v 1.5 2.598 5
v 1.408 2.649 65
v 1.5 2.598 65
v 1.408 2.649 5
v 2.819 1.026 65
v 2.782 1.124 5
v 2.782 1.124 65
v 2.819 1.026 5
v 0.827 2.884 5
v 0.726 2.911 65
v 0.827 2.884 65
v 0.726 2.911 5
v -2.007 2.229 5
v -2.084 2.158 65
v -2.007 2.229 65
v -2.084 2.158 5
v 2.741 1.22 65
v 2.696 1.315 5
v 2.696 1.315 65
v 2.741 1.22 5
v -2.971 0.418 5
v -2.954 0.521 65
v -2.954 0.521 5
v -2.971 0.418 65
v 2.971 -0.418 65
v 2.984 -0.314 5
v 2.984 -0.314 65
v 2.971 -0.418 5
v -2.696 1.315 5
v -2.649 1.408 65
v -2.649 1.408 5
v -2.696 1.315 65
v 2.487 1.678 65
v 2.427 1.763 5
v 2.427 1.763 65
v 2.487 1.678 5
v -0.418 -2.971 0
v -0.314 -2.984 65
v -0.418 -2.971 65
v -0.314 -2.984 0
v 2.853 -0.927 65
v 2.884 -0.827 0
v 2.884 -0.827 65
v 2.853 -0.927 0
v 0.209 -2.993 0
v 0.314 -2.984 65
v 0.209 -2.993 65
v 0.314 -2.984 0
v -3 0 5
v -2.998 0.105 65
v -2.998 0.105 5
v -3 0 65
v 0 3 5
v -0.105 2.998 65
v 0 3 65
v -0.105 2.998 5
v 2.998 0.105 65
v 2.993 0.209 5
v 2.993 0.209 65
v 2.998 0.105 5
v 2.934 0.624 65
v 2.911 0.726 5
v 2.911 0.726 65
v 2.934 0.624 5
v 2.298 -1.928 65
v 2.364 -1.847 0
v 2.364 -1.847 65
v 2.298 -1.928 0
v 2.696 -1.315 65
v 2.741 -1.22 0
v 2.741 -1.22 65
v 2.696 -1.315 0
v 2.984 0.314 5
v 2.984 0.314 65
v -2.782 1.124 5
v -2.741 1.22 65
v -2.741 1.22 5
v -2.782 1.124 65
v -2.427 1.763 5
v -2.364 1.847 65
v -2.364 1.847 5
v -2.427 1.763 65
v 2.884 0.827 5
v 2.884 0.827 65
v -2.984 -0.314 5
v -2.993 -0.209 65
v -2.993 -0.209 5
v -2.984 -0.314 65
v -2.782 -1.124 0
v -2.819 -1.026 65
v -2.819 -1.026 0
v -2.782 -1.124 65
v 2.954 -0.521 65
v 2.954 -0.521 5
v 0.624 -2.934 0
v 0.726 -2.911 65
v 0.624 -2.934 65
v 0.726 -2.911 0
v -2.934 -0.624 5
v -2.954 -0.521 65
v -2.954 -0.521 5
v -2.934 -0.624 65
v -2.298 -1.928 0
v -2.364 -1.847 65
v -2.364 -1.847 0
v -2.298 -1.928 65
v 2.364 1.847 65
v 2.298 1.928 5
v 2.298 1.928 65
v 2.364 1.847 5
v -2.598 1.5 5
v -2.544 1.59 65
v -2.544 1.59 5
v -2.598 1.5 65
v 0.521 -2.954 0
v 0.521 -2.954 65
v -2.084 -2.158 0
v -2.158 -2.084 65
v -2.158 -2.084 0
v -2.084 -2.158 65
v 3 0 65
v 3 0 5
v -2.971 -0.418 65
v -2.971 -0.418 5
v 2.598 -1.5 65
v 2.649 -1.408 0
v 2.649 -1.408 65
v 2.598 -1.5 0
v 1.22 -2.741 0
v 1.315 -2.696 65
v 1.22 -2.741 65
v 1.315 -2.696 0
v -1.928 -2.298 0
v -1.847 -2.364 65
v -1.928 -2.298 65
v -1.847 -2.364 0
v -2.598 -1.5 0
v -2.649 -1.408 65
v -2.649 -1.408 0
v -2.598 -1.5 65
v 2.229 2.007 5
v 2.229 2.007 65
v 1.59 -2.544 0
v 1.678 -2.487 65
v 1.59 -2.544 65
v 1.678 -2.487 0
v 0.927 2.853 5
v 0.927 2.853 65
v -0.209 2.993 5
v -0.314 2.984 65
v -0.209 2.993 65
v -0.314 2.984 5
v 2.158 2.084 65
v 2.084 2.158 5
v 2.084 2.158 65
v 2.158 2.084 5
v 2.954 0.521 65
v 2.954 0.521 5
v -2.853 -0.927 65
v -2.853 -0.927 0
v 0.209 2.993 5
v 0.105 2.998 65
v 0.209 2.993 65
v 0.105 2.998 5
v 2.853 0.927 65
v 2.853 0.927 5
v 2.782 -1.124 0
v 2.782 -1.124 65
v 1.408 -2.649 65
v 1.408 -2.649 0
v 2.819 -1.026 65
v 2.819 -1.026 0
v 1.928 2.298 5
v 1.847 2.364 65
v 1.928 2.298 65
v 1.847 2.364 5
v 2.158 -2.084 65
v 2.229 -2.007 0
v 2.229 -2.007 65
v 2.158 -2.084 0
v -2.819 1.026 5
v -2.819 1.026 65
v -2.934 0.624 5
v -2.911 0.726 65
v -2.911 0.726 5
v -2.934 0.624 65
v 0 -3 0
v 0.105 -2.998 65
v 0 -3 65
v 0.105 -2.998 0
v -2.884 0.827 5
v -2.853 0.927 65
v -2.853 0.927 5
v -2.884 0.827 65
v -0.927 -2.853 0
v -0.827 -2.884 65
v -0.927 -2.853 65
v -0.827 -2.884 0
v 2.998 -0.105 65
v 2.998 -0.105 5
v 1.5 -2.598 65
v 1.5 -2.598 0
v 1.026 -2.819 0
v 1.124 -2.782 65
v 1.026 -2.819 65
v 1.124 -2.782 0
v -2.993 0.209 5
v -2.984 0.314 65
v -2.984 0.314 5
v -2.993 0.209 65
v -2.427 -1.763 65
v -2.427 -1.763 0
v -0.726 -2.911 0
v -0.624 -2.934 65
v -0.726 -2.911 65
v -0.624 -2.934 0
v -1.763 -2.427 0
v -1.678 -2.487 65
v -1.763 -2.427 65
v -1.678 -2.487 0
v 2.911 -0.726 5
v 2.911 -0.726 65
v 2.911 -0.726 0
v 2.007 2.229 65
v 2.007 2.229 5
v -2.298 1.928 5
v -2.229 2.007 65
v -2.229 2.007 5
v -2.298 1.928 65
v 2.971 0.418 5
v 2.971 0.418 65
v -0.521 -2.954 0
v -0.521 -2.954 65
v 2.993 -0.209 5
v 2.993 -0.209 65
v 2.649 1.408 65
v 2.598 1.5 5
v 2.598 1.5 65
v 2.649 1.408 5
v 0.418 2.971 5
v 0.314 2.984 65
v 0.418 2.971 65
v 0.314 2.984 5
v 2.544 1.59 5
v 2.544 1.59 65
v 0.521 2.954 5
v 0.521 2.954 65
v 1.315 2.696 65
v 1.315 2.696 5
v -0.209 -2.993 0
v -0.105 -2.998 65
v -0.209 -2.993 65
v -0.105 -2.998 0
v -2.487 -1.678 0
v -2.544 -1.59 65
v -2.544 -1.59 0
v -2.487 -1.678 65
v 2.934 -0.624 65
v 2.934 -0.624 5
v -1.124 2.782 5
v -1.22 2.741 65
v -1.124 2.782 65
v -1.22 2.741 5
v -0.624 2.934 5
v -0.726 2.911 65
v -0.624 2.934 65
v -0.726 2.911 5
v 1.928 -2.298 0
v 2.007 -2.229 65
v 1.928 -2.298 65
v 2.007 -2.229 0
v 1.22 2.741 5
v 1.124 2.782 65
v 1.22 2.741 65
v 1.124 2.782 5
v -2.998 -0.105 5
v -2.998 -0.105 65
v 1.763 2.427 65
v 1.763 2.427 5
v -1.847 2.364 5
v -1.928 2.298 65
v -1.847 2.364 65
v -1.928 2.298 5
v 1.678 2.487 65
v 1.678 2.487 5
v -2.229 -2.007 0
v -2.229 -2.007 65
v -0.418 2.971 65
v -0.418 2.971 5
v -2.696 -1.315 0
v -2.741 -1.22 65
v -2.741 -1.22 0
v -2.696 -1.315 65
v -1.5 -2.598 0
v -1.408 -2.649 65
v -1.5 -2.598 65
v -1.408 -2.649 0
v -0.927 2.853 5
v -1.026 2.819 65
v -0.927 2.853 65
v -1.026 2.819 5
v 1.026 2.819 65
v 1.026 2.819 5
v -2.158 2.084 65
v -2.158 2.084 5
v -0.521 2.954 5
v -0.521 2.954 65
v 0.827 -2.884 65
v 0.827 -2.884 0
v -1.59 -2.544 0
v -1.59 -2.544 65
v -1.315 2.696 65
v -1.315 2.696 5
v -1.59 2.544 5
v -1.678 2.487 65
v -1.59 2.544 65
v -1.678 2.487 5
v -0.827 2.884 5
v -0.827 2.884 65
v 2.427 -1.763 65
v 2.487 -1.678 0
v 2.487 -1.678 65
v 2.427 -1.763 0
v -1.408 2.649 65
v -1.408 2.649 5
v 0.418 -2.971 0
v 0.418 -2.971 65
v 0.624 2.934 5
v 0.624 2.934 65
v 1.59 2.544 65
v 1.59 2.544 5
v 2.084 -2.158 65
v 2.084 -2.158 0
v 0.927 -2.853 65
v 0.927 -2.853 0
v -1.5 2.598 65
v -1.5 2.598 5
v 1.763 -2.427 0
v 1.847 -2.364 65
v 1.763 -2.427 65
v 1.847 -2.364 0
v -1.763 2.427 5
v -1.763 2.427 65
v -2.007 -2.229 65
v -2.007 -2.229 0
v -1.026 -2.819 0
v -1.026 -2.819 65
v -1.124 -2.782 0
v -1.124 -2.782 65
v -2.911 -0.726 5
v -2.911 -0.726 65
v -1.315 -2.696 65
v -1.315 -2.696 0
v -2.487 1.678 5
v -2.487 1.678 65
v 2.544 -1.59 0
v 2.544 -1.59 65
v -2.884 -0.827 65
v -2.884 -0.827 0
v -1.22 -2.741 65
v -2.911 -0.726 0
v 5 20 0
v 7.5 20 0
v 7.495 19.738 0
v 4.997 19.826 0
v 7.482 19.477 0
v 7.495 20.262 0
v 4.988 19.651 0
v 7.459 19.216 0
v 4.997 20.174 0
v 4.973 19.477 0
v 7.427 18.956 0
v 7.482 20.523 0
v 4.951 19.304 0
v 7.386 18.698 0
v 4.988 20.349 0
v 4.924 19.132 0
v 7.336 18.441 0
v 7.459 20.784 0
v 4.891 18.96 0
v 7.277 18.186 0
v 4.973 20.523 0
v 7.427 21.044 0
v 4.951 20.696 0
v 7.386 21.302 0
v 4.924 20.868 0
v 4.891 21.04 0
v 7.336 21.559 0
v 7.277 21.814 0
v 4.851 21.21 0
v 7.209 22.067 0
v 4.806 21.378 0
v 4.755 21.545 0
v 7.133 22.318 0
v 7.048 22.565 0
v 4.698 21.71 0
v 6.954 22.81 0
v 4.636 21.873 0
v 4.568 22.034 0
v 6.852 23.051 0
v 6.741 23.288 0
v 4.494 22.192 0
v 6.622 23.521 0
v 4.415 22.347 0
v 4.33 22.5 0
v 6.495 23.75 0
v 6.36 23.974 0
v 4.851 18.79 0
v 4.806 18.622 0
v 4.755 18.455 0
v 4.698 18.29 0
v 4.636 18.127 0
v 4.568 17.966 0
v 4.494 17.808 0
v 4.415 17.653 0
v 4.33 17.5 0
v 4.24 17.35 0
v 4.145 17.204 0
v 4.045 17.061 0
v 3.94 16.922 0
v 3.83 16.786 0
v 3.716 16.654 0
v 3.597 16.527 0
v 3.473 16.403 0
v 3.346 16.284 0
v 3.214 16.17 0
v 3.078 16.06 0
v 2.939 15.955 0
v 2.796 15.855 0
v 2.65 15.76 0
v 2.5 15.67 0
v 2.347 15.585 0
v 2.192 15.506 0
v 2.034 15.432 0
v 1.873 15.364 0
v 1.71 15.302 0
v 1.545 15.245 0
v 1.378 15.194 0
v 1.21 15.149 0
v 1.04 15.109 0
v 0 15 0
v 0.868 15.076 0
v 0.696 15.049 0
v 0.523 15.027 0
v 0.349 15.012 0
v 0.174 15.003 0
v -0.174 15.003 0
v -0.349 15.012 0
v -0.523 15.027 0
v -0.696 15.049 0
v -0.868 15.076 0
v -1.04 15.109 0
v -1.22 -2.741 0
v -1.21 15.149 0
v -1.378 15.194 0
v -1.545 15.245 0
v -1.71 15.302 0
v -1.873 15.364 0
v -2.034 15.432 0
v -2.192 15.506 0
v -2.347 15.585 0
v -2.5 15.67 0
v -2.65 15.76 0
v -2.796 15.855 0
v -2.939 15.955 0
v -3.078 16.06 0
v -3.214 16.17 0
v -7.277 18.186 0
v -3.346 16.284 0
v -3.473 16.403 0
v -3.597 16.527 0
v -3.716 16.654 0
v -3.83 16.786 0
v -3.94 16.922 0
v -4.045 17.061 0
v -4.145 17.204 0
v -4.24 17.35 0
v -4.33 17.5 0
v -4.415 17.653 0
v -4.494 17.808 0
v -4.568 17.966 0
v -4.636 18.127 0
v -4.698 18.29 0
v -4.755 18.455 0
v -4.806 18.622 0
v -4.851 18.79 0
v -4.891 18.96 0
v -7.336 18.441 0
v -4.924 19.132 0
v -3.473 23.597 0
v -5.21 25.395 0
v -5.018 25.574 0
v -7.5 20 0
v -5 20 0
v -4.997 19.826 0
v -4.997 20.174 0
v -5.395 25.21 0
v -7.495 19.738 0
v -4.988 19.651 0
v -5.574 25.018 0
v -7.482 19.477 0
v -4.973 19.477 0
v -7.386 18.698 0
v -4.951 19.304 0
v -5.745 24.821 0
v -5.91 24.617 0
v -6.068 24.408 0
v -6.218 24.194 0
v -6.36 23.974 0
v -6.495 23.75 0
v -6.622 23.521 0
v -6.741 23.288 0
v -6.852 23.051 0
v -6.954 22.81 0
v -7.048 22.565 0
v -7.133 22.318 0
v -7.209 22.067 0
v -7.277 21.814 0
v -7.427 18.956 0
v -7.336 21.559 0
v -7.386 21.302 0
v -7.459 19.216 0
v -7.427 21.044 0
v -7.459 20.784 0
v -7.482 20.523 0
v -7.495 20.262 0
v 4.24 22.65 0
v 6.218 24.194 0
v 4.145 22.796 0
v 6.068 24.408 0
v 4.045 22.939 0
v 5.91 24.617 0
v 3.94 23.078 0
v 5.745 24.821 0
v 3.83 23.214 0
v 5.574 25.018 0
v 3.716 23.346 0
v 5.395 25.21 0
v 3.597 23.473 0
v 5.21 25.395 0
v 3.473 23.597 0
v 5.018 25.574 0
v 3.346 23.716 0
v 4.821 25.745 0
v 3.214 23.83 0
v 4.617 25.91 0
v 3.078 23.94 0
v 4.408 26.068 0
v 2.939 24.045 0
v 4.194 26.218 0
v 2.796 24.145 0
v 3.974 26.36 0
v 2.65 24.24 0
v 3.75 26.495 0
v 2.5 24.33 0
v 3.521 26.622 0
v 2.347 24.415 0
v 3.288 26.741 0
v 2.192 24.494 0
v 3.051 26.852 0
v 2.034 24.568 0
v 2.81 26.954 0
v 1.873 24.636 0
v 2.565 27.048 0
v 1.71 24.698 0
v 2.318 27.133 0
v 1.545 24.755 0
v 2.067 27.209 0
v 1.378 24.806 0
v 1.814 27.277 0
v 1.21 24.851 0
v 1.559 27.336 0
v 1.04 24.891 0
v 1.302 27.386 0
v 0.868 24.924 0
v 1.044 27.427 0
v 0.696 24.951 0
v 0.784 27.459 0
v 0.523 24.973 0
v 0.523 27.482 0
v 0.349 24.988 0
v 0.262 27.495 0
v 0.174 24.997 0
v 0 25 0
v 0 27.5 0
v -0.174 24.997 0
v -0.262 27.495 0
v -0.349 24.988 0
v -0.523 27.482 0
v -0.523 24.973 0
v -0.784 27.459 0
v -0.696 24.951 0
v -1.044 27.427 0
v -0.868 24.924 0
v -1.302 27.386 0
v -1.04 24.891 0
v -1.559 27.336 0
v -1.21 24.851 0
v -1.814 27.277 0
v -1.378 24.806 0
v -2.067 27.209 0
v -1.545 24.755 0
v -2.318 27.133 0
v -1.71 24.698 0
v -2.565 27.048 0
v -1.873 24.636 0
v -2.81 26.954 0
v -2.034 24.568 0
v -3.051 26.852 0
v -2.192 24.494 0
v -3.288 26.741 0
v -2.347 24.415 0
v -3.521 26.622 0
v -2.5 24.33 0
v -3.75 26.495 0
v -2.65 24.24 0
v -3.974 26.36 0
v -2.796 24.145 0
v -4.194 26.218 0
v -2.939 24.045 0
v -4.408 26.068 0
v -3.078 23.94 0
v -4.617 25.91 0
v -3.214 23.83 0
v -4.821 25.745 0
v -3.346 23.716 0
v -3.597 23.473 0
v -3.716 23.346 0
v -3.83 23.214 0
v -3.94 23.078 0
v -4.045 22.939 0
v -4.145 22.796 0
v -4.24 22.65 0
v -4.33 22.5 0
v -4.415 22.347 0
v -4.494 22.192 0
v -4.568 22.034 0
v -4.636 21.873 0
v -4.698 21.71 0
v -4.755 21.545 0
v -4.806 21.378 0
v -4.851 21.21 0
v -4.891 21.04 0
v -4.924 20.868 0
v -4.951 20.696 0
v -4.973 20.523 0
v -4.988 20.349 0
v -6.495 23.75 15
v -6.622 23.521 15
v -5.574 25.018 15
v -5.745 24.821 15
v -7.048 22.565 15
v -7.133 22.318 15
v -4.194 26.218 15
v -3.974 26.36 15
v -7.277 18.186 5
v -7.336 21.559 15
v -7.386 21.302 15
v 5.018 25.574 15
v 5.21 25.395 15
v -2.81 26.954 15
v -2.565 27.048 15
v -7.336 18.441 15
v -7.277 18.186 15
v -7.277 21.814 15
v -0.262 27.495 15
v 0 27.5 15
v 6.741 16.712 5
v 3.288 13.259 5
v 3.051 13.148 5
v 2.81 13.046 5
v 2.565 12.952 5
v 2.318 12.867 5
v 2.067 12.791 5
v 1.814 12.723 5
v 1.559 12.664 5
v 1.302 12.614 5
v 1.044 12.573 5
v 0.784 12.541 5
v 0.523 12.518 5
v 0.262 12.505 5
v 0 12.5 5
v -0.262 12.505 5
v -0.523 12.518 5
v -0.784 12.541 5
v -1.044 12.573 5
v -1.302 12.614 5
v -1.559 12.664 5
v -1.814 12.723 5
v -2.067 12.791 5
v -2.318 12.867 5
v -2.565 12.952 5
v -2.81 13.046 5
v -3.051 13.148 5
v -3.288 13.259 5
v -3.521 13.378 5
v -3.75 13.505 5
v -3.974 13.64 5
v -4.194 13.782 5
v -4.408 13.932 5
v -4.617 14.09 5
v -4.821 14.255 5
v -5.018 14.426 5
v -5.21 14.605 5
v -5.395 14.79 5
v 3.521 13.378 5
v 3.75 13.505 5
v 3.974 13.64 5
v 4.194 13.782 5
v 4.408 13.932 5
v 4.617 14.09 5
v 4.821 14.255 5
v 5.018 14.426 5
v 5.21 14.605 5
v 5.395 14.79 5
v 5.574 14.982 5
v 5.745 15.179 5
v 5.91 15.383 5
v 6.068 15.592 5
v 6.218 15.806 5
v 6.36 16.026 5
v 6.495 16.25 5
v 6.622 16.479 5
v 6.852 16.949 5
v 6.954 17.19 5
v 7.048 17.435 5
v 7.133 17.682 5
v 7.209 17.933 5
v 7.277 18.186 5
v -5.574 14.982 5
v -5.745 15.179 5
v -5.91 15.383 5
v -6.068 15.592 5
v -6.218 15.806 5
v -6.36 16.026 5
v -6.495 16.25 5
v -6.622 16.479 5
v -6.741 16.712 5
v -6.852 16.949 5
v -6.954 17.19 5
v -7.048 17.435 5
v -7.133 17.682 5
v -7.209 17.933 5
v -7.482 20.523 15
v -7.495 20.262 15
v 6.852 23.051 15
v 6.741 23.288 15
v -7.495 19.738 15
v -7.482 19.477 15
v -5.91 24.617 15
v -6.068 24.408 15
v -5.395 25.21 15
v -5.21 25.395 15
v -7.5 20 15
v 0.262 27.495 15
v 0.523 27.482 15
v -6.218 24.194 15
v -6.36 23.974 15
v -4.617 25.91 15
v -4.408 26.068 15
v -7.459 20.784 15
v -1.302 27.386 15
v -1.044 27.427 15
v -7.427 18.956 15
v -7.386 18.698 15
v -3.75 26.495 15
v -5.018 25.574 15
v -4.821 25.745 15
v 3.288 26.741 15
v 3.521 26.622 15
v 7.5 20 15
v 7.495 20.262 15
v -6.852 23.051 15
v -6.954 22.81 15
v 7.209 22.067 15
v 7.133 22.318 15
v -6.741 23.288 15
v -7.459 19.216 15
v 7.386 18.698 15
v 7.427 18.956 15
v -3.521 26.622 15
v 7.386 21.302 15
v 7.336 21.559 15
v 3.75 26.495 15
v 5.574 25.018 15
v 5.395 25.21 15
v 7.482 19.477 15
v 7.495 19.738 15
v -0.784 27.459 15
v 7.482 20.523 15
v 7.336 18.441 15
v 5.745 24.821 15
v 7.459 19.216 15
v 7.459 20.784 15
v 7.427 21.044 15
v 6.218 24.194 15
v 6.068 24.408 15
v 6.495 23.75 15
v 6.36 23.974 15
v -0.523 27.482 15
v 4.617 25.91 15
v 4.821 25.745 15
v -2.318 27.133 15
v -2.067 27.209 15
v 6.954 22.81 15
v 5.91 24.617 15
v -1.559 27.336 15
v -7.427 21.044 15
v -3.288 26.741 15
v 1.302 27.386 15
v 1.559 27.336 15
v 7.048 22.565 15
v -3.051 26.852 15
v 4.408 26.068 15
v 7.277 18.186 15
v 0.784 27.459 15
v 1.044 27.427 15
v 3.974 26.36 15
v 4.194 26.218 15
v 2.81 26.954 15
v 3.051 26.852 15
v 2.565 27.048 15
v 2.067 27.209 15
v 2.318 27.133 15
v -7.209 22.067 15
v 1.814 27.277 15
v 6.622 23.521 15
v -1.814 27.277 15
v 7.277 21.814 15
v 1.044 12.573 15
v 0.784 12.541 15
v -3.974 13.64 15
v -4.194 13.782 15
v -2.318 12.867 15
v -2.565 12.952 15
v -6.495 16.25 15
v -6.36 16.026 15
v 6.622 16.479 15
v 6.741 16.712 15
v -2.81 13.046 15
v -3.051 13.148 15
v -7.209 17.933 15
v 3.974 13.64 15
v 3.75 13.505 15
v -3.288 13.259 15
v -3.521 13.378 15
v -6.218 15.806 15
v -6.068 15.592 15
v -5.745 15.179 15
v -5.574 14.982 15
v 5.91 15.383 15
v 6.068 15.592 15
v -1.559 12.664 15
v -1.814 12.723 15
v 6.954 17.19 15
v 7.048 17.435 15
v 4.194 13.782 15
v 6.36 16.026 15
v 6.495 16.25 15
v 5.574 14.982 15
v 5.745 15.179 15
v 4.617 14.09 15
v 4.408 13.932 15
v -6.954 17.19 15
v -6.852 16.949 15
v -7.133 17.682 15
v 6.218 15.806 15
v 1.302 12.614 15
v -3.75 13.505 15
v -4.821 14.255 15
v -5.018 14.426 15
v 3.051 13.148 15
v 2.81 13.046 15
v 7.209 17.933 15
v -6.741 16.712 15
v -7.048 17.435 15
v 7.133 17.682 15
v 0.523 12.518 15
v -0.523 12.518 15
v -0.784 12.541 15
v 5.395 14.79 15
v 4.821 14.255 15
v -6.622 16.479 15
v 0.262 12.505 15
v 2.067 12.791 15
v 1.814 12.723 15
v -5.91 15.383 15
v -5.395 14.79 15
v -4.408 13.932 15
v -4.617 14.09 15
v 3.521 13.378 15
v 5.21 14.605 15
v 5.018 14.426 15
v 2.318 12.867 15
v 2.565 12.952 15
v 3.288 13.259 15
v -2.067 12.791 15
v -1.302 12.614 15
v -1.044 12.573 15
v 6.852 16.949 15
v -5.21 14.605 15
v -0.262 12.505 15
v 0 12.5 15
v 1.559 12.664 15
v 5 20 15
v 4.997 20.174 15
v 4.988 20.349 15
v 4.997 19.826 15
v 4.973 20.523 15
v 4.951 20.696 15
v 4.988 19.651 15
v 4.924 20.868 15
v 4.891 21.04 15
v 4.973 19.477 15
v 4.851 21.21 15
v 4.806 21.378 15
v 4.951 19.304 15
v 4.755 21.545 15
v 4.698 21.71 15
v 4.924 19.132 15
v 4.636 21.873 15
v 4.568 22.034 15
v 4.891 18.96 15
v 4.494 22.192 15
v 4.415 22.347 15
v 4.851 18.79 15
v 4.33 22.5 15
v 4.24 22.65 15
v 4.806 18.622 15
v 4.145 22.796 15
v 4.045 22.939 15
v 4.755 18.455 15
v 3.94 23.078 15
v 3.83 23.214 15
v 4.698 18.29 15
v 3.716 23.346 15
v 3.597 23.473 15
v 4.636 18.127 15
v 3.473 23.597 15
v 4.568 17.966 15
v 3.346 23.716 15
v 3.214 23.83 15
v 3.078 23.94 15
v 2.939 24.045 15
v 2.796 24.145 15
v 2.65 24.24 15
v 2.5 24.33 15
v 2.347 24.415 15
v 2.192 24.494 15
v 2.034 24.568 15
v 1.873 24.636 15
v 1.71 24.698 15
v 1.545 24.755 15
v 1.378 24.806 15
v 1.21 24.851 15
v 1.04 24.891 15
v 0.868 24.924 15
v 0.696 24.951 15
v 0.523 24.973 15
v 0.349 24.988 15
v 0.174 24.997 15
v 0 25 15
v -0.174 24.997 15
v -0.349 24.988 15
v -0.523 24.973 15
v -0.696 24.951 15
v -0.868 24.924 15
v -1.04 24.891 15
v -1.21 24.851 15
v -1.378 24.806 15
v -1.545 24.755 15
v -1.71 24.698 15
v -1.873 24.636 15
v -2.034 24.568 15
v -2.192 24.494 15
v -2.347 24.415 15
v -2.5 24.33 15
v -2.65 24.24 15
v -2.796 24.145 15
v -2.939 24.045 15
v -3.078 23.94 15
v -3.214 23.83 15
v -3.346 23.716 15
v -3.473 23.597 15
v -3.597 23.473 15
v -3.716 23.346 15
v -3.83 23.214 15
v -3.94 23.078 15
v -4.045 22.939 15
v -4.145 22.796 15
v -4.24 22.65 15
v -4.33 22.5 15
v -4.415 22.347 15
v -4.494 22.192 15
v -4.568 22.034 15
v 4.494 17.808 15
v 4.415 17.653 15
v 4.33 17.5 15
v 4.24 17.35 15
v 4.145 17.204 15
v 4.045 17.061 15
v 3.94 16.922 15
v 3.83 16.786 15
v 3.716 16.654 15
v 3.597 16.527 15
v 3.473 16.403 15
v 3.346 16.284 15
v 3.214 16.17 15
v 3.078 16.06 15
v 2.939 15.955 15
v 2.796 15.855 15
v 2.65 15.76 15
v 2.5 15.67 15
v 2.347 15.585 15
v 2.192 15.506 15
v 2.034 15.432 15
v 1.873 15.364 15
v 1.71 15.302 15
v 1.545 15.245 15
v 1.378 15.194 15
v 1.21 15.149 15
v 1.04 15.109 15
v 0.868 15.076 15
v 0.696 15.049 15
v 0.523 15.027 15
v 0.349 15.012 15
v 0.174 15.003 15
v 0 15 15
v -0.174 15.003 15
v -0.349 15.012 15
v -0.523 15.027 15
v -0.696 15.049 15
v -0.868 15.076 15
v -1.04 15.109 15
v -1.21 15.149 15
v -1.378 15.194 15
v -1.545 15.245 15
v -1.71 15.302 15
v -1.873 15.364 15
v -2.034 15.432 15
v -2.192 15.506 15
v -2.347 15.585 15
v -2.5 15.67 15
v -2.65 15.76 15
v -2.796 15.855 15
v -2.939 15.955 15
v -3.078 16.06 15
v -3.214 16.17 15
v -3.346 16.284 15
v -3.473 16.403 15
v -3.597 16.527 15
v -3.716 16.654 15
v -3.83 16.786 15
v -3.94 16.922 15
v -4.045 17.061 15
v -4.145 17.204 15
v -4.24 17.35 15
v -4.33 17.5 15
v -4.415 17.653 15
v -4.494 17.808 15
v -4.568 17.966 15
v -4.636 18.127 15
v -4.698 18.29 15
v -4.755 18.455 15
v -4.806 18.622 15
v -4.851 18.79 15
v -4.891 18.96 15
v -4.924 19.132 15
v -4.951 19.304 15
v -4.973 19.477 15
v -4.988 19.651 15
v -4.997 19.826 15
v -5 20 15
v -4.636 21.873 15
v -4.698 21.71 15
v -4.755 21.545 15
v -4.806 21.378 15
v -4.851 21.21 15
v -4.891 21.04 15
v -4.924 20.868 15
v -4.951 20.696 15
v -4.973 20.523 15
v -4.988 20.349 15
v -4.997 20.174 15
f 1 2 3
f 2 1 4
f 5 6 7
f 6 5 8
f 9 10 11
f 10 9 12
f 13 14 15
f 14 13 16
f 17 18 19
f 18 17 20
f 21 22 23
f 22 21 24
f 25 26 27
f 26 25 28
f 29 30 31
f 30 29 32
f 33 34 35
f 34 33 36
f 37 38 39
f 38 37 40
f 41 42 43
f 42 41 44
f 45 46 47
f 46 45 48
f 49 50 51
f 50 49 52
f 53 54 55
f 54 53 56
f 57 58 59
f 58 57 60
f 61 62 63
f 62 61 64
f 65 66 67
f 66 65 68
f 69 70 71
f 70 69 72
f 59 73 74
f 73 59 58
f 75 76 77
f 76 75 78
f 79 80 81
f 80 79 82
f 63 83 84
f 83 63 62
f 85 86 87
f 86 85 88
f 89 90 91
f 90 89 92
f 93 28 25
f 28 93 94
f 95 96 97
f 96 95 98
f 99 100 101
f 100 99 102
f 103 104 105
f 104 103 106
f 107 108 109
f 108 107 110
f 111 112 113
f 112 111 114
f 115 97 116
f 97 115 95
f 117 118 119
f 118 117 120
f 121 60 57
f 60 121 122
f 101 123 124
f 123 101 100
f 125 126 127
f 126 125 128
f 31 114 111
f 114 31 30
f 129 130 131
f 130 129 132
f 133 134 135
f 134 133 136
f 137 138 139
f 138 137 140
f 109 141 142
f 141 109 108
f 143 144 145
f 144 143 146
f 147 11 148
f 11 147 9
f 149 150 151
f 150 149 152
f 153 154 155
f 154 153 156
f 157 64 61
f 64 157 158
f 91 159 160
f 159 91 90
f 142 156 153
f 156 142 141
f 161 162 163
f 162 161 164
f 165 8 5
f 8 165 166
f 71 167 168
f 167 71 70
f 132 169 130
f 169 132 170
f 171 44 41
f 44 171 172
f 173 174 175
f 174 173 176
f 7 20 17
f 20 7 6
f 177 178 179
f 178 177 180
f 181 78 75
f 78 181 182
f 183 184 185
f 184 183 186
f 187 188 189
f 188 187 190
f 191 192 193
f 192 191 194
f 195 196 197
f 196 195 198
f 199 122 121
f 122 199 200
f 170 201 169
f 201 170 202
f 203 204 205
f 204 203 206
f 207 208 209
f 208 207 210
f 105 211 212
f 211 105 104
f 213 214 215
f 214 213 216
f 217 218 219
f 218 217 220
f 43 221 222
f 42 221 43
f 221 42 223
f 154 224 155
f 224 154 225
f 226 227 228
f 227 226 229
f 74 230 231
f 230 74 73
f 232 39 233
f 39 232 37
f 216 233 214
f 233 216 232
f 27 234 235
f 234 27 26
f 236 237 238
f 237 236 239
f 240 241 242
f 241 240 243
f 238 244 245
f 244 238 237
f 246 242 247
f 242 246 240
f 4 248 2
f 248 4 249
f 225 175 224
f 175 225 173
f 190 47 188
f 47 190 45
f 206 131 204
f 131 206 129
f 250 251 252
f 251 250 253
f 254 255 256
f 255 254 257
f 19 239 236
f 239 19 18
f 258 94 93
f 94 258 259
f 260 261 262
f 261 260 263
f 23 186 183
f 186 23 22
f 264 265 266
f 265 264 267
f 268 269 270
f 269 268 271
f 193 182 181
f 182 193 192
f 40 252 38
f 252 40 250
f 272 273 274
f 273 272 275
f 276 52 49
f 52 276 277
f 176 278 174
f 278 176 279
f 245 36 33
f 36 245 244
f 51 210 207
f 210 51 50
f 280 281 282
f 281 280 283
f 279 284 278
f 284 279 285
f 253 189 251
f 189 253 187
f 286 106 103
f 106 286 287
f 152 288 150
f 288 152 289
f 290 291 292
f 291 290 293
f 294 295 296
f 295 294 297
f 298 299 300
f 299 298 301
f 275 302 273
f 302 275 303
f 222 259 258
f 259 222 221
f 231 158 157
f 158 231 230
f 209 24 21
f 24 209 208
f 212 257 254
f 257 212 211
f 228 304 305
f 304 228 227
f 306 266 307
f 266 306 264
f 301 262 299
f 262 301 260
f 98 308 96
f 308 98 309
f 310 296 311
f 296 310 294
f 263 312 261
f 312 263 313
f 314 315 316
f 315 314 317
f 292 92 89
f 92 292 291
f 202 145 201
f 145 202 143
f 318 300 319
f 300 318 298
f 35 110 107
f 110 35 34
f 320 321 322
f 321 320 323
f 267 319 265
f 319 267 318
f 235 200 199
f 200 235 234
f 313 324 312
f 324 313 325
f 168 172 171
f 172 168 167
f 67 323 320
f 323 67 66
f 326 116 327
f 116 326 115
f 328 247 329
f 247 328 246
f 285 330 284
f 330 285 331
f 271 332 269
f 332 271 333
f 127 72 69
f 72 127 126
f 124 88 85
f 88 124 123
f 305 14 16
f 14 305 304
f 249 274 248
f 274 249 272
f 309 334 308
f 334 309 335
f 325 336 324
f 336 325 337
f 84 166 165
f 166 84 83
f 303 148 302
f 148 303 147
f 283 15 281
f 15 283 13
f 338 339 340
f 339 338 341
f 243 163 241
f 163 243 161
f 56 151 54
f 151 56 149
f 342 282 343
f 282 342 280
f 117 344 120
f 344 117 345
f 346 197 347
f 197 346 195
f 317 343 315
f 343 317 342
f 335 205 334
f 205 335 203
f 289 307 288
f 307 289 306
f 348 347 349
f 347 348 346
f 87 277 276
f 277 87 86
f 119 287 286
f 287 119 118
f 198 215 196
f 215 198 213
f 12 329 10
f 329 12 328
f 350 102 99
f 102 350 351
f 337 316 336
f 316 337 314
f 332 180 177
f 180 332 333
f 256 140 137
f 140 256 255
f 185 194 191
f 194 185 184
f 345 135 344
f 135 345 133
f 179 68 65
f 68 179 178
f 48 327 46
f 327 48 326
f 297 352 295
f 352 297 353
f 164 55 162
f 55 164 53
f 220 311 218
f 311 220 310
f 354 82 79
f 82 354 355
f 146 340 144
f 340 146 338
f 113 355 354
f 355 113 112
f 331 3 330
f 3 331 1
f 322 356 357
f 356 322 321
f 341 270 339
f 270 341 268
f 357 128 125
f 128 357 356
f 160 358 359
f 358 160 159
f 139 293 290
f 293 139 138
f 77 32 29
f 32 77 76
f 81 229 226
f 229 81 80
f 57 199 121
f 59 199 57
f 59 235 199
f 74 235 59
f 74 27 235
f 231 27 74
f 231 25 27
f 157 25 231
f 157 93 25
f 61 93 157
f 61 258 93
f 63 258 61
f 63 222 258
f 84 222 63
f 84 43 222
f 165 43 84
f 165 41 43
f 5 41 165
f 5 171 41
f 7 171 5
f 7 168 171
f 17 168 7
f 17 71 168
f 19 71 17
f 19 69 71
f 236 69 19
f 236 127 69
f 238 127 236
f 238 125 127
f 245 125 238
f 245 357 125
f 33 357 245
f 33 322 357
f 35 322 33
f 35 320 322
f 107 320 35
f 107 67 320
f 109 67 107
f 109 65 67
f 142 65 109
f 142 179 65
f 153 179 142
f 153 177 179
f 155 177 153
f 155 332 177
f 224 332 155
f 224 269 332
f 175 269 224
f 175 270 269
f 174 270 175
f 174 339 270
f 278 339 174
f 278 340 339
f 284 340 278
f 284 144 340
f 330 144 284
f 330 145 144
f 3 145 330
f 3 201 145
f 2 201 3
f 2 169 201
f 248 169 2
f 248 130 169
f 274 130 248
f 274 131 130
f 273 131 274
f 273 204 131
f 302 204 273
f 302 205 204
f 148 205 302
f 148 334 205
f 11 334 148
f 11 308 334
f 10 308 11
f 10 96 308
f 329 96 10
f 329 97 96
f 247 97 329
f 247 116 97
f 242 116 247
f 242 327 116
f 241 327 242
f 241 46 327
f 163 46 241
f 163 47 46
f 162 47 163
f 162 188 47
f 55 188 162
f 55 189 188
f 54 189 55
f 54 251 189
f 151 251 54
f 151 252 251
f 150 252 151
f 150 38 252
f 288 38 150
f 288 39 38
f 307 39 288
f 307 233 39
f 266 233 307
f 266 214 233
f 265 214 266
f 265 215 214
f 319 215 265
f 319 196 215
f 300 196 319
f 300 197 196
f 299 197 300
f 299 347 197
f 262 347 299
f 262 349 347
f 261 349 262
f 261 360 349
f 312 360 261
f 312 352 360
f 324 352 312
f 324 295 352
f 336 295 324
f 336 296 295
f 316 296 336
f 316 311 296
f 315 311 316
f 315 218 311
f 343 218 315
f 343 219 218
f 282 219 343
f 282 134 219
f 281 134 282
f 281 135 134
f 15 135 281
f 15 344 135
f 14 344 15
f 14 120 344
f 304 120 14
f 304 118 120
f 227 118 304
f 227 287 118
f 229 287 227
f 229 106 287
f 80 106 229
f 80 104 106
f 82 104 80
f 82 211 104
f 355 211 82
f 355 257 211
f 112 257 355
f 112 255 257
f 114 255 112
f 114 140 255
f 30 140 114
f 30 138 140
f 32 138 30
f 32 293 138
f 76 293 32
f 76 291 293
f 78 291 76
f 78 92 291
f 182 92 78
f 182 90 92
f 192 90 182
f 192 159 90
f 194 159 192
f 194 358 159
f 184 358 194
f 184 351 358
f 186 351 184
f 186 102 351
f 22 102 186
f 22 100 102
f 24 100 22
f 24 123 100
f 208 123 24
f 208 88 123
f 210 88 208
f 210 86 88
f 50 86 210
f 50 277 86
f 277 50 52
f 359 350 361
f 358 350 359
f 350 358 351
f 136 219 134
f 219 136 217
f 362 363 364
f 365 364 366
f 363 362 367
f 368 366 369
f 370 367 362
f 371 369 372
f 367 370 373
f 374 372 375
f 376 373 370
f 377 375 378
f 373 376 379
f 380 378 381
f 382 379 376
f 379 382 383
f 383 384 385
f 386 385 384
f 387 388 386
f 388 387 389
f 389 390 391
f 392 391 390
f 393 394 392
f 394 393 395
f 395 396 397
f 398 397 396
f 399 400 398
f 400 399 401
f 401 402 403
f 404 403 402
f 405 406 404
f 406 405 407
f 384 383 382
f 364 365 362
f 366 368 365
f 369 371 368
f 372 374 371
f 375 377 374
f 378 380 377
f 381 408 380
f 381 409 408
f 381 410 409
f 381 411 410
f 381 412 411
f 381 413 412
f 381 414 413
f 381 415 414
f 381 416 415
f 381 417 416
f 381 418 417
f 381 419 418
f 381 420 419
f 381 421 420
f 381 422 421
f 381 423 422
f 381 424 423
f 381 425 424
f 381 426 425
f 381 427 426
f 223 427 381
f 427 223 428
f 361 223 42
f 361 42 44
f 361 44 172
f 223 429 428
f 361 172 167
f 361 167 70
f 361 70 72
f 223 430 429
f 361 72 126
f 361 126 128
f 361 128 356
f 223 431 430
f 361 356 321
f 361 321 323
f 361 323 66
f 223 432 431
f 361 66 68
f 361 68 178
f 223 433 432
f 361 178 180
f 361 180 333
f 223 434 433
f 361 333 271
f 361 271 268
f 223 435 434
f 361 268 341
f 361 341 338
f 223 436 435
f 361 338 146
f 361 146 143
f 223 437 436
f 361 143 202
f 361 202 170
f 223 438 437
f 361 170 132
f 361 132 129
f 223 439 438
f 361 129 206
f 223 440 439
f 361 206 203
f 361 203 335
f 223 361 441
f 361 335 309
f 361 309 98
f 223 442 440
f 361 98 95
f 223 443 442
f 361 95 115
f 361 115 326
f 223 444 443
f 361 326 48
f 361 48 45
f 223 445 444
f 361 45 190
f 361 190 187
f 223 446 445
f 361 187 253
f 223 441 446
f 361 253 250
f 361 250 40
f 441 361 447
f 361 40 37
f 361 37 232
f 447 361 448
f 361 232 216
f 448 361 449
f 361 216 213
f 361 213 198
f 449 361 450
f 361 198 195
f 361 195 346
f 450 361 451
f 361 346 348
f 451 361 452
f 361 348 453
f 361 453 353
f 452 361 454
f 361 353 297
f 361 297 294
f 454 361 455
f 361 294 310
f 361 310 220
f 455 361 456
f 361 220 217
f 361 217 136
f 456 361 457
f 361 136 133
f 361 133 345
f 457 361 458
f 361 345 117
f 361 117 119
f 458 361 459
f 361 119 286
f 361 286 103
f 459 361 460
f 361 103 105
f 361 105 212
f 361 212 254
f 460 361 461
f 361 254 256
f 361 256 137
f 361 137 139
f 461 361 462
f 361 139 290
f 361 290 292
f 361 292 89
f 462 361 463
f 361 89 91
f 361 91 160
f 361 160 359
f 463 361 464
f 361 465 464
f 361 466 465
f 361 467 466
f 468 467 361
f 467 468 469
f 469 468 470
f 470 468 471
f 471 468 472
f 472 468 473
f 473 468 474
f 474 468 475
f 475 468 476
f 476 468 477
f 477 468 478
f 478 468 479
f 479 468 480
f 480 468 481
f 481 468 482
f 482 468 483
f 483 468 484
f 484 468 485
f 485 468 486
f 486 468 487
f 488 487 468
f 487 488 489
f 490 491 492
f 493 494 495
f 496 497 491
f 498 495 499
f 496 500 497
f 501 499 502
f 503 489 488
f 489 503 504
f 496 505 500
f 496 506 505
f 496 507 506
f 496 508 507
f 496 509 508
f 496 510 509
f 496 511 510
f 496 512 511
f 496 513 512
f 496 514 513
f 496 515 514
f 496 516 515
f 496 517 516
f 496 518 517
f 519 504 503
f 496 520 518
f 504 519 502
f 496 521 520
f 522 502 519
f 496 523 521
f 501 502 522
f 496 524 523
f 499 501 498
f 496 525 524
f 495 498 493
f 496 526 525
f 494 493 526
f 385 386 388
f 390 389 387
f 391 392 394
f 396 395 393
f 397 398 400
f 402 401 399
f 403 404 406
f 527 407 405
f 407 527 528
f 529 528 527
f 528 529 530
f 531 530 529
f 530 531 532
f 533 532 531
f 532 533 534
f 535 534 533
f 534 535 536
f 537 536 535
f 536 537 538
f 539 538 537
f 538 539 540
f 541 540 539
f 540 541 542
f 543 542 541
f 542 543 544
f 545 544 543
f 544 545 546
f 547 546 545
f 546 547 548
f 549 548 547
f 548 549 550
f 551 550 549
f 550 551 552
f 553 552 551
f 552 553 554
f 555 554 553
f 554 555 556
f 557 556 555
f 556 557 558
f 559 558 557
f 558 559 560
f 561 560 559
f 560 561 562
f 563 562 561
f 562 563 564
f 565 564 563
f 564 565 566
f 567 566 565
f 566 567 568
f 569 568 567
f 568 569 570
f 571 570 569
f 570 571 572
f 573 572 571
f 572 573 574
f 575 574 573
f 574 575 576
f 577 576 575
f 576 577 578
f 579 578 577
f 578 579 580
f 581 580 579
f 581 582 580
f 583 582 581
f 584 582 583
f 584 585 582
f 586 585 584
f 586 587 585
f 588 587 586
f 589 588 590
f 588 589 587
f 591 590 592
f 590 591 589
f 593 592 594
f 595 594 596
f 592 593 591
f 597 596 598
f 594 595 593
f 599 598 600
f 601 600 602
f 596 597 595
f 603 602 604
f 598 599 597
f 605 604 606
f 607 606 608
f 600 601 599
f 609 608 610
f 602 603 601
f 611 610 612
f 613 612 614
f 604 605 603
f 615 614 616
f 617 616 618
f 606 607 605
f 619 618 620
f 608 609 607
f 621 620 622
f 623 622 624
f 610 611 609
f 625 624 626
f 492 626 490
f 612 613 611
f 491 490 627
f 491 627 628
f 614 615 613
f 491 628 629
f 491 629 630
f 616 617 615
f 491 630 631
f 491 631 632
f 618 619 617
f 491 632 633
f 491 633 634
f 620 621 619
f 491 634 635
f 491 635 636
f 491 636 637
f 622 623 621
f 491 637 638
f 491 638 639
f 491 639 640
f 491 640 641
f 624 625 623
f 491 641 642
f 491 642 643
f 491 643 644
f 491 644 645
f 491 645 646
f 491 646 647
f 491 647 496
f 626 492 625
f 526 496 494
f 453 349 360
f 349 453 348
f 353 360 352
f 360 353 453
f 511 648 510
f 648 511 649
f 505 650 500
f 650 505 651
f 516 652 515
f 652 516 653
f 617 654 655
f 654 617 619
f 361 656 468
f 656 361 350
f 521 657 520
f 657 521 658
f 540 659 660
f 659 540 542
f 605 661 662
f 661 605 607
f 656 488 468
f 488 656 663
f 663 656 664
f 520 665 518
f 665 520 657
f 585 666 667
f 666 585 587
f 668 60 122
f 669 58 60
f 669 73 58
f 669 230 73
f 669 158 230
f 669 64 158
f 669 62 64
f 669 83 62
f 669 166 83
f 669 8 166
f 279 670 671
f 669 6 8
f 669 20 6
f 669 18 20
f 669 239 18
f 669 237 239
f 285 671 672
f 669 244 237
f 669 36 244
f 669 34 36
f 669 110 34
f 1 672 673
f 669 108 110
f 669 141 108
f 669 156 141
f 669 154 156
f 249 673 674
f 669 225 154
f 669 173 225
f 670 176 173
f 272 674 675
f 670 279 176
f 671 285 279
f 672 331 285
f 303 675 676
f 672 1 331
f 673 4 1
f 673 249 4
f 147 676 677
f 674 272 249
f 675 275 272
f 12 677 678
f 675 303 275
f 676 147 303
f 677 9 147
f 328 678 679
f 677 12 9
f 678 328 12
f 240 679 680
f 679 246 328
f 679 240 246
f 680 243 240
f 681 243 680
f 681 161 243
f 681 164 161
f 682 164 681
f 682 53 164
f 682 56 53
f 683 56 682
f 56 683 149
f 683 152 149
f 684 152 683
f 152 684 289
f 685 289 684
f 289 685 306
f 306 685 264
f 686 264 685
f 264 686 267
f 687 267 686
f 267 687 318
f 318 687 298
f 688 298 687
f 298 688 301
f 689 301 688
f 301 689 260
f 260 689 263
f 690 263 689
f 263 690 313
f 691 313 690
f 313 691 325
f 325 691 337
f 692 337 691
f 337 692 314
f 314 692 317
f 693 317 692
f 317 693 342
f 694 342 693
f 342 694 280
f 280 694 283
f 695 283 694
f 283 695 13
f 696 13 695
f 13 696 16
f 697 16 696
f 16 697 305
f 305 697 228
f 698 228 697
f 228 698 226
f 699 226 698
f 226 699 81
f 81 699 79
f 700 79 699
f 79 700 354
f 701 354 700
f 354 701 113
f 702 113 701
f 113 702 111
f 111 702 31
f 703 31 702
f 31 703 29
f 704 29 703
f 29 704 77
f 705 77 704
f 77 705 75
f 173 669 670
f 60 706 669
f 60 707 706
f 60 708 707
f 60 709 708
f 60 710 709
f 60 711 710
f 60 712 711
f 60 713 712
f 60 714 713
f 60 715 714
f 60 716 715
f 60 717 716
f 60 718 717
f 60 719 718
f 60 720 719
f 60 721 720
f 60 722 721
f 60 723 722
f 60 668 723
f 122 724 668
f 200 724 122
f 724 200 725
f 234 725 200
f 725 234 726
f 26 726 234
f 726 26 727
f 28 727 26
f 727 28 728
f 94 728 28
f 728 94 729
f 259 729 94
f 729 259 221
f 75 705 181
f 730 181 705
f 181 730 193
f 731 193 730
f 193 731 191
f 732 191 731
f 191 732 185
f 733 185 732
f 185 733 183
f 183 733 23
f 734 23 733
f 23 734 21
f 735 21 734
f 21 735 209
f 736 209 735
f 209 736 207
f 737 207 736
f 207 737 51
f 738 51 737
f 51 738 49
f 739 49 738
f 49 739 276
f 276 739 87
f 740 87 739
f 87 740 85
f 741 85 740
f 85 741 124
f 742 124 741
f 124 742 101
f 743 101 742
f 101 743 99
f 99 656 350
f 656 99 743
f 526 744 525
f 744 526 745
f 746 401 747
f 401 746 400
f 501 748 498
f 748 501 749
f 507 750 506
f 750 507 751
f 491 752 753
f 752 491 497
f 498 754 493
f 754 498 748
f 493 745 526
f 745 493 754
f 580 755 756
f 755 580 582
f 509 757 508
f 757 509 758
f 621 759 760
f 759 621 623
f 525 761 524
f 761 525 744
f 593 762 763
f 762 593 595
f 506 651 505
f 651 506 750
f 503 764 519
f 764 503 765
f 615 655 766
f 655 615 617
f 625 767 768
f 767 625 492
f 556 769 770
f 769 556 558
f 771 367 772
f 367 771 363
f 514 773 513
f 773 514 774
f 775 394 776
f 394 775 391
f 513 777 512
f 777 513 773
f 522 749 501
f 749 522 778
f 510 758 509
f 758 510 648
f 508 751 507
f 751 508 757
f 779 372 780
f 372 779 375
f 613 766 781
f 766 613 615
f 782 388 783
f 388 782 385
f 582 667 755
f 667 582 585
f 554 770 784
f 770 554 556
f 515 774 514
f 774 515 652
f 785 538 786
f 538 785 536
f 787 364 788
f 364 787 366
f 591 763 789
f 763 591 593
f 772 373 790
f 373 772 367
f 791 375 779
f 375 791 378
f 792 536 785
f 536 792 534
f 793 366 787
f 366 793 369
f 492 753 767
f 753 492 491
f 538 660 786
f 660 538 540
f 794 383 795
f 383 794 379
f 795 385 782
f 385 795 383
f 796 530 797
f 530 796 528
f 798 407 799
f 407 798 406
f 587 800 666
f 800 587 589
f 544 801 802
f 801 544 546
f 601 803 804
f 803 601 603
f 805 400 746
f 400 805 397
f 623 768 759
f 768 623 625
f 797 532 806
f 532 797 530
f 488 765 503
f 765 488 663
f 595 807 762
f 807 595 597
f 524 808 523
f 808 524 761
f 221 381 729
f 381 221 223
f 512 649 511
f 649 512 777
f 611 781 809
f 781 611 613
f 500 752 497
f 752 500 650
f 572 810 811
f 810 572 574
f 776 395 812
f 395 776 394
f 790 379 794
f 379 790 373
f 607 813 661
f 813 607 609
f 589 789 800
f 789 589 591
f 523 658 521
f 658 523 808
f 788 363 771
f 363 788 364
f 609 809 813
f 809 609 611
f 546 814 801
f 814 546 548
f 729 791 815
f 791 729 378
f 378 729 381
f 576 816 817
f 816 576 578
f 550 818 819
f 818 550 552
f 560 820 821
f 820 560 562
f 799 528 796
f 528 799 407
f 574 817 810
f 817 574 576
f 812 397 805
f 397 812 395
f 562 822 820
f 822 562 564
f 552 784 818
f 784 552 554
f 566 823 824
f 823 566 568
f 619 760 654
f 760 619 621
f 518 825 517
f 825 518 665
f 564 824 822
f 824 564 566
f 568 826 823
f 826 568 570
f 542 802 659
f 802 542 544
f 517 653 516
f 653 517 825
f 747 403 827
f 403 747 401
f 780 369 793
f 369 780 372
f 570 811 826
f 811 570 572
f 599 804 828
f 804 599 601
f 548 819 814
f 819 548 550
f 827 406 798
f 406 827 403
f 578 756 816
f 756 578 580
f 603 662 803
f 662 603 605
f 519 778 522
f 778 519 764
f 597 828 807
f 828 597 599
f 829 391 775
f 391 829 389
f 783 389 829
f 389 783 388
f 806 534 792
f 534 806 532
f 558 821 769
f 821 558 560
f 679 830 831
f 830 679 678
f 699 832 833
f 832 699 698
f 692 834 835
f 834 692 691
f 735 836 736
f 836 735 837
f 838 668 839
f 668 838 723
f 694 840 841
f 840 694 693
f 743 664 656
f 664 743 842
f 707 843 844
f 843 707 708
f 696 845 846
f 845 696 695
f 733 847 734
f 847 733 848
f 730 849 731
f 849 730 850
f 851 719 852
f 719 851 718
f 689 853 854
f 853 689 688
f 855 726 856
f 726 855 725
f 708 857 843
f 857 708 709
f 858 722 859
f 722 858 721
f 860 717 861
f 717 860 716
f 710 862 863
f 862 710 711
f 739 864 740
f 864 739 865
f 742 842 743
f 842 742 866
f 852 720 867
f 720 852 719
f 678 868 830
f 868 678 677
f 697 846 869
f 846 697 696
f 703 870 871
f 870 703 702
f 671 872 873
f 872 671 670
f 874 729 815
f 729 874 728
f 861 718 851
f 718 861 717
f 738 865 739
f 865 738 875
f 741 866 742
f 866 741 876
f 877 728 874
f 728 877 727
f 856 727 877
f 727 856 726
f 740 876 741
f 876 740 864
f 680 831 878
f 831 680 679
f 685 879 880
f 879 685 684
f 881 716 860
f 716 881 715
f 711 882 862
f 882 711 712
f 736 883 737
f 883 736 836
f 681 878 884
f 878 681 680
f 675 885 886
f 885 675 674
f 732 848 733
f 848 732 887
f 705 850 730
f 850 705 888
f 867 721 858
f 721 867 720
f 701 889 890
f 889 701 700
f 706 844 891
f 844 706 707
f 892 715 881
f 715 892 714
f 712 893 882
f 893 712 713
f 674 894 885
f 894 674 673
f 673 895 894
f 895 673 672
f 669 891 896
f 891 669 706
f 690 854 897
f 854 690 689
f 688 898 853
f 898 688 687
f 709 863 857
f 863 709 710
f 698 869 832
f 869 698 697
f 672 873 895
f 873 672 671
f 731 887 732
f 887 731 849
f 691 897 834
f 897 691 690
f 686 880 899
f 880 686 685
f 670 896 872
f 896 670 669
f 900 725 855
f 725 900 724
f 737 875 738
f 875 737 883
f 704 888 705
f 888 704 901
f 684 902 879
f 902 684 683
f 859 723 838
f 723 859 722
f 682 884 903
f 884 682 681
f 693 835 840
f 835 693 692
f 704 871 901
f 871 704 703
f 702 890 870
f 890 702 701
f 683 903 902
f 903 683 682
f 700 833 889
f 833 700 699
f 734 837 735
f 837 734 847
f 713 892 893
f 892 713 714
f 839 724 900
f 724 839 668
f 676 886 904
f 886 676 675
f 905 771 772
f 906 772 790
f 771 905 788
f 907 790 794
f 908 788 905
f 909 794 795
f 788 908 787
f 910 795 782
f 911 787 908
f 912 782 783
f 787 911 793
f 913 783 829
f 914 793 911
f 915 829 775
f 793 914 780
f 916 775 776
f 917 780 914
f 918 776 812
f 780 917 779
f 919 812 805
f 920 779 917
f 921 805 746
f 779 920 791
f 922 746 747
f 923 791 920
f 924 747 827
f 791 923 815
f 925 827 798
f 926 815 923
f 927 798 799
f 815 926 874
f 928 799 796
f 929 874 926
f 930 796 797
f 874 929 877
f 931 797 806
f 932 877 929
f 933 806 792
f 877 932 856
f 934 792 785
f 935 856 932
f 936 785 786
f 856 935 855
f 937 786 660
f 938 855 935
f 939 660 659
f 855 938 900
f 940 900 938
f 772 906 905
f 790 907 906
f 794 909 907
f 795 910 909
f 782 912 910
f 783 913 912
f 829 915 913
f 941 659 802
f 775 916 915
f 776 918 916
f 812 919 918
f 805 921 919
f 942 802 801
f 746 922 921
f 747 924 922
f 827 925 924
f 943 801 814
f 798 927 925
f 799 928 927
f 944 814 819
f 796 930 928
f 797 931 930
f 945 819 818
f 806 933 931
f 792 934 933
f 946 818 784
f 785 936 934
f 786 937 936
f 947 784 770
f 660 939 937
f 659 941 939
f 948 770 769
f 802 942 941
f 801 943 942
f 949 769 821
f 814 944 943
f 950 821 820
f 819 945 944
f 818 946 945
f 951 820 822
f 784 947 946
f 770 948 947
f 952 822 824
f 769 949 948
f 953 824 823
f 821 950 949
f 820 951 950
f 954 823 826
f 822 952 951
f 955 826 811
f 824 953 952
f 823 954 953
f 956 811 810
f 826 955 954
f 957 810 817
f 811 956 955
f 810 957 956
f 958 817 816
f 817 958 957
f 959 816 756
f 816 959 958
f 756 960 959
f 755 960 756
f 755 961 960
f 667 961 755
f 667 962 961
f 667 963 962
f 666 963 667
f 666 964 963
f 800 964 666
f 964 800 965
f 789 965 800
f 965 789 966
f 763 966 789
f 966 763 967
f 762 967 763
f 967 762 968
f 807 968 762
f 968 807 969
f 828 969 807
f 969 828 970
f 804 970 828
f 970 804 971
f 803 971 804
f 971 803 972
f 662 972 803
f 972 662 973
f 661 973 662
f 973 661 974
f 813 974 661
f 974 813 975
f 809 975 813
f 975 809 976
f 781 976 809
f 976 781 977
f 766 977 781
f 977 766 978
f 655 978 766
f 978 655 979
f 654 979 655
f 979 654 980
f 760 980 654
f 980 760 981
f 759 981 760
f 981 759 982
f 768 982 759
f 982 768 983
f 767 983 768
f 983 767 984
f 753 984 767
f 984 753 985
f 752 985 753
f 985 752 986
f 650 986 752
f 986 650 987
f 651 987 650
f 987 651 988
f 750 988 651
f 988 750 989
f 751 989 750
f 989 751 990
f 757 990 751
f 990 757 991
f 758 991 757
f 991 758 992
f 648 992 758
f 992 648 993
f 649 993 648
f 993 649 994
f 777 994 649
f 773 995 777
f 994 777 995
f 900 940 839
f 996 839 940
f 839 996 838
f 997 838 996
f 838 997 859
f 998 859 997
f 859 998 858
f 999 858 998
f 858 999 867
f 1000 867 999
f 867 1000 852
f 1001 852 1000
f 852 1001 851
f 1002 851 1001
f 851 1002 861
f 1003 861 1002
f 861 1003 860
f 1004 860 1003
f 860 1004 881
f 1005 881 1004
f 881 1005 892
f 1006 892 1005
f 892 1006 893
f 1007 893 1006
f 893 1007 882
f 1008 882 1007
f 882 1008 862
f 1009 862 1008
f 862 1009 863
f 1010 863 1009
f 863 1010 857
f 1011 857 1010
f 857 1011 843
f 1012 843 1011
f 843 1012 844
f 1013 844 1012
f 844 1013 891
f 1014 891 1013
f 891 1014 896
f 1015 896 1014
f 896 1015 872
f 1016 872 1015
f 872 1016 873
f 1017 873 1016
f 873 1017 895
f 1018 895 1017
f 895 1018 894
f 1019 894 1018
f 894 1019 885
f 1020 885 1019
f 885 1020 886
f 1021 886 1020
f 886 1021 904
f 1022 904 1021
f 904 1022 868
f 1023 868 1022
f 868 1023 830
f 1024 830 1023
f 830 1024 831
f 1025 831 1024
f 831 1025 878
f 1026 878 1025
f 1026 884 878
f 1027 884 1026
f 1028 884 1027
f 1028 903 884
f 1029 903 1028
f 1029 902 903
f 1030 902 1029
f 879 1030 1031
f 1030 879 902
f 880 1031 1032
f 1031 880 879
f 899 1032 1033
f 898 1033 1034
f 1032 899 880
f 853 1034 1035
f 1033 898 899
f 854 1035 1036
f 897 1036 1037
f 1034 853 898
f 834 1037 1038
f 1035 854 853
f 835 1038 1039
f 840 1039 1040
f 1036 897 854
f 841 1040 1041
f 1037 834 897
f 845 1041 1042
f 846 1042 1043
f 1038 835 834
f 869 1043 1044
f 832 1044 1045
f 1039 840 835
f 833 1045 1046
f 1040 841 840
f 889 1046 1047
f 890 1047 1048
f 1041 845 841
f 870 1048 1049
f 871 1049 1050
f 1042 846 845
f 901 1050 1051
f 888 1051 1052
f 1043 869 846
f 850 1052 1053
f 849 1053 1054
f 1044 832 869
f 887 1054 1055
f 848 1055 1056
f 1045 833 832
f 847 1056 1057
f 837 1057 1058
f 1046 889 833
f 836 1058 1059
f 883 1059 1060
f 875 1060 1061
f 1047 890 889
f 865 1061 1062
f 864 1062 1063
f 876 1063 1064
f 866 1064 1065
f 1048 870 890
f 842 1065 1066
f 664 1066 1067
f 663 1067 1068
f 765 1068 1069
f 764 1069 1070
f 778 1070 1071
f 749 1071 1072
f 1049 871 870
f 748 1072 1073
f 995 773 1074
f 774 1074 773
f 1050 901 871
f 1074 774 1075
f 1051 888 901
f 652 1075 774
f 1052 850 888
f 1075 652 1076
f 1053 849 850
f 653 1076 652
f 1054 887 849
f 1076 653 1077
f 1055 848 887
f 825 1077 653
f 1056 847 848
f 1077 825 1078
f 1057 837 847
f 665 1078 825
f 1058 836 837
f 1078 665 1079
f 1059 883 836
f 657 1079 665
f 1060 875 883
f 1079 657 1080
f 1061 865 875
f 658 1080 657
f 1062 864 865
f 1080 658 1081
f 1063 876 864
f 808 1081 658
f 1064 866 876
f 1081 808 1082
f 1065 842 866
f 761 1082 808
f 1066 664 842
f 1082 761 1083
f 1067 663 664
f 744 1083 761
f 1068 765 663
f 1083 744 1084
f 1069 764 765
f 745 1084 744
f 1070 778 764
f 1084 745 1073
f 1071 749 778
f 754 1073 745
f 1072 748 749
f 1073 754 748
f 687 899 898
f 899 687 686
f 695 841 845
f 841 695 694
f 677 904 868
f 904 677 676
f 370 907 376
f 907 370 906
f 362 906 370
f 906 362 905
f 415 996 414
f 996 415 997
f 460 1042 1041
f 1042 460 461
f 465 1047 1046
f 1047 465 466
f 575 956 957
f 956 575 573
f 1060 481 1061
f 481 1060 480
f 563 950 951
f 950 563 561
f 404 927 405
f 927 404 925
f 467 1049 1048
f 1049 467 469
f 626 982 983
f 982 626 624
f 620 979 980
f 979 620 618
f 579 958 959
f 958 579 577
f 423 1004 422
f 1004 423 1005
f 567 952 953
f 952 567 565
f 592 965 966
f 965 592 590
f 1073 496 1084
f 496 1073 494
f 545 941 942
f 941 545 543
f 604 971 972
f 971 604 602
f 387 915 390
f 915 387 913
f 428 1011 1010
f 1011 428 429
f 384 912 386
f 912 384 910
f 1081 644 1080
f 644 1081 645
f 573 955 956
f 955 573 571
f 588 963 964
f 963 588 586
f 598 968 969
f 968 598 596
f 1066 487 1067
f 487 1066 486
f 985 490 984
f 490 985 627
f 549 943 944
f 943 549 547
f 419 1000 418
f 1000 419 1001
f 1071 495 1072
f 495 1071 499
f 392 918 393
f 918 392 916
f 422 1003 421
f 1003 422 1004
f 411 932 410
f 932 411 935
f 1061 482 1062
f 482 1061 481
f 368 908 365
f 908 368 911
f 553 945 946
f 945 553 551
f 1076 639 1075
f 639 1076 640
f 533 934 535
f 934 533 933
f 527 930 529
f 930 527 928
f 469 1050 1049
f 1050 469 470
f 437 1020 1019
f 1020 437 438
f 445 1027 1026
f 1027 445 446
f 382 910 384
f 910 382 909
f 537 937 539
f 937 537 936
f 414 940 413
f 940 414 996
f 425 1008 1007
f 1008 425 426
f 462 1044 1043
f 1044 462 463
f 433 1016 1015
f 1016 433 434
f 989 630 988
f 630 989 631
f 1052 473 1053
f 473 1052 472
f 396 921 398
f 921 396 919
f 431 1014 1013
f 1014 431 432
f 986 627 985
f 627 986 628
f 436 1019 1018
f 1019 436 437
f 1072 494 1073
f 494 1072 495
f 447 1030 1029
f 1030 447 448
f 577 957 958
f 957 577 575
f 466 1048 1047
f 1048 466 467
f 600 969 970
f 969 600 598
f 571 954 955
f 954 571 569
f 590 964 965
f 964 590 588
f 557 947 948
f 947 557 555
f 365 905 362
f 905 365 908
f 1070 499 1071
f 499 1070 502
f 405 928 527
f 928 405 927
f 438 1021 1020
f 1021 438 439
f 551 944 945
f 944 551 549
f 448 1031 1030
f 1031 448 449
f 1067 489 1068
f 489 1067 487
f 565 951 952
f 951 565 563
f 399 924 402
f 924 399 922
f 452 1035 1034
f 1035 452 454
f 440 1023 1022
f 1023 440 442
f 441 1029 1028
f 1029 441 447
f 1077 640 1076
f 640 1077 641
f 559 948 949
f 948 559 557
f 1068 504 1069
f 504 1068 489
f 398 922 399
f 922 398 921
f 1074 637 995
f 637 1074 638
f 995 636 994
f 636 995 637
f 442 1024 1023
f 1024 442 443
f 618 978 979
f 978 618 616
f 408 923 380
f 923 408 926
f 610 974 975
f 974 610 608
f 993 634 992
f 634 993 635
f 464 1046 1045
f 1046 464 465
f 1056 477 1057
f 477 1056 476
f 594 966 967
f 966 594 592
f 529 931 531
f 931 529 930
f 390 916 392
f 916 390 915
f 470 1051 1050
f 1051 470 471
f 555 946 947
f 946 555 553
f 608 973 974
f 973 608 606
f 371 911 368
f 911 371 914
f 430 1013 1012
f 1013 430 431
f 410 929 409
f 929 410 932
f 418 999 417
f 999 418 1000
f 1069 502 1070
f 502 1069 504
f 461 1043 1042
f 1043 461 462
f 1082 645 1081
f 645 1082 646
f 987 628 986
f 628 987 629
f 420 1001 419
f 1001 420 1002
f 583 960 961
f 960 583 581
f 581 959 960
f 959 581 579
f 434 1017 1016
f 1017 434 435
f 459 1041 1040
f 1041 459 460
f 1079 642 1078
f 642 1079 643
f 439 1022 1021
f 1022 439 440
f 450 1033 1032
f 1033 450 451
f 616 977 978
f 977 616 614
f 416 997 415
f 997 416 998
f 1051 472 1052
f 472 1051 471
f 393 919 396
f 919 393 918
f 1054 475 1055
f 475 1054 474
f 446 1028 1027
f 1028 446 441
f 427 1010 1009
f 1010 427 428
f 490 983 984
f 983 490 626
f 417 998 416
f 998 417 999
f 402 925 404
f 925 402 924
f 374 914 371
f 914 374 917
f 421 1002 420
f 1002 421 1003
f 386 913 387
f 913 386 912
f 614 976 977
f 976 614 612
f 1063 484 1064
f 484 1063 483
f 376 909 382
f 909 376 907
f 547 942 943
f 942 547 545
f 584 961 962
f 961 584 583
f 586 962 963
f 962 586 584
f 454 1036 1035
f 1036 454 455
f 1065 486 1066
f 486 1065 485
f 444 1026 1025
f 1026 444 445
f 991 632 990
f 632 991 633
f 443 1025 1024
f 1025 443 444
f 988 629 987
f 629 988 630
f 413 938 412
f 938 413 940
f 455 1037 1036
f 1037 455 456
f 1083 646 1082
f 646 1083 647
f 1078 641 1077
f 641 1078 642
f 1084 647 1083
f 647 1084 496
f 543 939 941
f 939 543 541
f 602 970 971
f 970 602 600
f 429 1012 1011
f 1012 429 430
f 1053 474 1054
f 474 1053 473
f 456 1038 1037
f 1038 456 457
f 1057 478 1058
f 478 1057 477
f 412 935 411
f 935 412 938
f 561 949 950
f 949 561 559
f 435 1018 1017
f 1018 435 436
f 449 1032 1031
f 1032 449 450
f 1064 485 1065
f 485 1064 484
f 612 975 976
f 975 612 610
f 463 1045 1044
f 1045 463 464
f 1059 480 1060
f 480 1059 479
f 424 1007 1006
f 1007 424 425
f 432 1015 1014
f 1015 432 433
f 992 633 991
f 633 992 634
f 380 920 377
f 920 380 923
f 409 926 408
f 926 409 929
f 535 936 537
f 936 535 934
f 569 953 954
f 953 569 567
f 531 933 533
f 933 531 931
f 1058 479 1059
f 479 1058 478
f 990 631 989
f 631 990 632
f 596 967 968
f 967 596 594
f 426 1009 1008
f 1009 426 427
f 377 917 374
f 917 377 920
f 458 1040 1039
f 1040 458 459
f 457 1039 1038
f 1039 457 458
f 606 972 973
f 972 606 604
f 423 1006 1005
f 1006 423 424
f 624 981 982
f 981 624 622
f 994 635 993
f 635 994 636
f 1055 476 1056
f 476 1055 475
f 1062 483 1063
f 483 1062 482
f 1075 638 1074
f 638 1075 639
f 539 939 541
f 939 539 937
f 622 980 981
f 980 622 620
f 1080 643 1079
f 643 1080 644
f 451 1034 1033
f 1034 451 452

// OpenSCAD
$fn=180;

bag_roll_width=60;
bag_roll_diameter=6;
towel_diameter=10;
thickness=2.5;
gap_between=20;

difference() {
  union() {
    //bag holder
    cylinder(d=bag_roll_diameter, h=bag_roll_width+thickness*2);

    //connector
    hull() {
      cylinder(d=bag_roll_diameter, h=thickness*2);

      translate([0, gap_between, 0])
      cylinder(d=towel_diameter+thickness*2, h=thickness*2);
    }

    //slider
    translate([0, gap_between, 0])
    difference() {
        cylinder(d=towel_diameter+thickness*2, h=15);
    }
  }

  translate([0, gap_between, 0])
  cylinder(d=towel_diameter, h=25);
}
